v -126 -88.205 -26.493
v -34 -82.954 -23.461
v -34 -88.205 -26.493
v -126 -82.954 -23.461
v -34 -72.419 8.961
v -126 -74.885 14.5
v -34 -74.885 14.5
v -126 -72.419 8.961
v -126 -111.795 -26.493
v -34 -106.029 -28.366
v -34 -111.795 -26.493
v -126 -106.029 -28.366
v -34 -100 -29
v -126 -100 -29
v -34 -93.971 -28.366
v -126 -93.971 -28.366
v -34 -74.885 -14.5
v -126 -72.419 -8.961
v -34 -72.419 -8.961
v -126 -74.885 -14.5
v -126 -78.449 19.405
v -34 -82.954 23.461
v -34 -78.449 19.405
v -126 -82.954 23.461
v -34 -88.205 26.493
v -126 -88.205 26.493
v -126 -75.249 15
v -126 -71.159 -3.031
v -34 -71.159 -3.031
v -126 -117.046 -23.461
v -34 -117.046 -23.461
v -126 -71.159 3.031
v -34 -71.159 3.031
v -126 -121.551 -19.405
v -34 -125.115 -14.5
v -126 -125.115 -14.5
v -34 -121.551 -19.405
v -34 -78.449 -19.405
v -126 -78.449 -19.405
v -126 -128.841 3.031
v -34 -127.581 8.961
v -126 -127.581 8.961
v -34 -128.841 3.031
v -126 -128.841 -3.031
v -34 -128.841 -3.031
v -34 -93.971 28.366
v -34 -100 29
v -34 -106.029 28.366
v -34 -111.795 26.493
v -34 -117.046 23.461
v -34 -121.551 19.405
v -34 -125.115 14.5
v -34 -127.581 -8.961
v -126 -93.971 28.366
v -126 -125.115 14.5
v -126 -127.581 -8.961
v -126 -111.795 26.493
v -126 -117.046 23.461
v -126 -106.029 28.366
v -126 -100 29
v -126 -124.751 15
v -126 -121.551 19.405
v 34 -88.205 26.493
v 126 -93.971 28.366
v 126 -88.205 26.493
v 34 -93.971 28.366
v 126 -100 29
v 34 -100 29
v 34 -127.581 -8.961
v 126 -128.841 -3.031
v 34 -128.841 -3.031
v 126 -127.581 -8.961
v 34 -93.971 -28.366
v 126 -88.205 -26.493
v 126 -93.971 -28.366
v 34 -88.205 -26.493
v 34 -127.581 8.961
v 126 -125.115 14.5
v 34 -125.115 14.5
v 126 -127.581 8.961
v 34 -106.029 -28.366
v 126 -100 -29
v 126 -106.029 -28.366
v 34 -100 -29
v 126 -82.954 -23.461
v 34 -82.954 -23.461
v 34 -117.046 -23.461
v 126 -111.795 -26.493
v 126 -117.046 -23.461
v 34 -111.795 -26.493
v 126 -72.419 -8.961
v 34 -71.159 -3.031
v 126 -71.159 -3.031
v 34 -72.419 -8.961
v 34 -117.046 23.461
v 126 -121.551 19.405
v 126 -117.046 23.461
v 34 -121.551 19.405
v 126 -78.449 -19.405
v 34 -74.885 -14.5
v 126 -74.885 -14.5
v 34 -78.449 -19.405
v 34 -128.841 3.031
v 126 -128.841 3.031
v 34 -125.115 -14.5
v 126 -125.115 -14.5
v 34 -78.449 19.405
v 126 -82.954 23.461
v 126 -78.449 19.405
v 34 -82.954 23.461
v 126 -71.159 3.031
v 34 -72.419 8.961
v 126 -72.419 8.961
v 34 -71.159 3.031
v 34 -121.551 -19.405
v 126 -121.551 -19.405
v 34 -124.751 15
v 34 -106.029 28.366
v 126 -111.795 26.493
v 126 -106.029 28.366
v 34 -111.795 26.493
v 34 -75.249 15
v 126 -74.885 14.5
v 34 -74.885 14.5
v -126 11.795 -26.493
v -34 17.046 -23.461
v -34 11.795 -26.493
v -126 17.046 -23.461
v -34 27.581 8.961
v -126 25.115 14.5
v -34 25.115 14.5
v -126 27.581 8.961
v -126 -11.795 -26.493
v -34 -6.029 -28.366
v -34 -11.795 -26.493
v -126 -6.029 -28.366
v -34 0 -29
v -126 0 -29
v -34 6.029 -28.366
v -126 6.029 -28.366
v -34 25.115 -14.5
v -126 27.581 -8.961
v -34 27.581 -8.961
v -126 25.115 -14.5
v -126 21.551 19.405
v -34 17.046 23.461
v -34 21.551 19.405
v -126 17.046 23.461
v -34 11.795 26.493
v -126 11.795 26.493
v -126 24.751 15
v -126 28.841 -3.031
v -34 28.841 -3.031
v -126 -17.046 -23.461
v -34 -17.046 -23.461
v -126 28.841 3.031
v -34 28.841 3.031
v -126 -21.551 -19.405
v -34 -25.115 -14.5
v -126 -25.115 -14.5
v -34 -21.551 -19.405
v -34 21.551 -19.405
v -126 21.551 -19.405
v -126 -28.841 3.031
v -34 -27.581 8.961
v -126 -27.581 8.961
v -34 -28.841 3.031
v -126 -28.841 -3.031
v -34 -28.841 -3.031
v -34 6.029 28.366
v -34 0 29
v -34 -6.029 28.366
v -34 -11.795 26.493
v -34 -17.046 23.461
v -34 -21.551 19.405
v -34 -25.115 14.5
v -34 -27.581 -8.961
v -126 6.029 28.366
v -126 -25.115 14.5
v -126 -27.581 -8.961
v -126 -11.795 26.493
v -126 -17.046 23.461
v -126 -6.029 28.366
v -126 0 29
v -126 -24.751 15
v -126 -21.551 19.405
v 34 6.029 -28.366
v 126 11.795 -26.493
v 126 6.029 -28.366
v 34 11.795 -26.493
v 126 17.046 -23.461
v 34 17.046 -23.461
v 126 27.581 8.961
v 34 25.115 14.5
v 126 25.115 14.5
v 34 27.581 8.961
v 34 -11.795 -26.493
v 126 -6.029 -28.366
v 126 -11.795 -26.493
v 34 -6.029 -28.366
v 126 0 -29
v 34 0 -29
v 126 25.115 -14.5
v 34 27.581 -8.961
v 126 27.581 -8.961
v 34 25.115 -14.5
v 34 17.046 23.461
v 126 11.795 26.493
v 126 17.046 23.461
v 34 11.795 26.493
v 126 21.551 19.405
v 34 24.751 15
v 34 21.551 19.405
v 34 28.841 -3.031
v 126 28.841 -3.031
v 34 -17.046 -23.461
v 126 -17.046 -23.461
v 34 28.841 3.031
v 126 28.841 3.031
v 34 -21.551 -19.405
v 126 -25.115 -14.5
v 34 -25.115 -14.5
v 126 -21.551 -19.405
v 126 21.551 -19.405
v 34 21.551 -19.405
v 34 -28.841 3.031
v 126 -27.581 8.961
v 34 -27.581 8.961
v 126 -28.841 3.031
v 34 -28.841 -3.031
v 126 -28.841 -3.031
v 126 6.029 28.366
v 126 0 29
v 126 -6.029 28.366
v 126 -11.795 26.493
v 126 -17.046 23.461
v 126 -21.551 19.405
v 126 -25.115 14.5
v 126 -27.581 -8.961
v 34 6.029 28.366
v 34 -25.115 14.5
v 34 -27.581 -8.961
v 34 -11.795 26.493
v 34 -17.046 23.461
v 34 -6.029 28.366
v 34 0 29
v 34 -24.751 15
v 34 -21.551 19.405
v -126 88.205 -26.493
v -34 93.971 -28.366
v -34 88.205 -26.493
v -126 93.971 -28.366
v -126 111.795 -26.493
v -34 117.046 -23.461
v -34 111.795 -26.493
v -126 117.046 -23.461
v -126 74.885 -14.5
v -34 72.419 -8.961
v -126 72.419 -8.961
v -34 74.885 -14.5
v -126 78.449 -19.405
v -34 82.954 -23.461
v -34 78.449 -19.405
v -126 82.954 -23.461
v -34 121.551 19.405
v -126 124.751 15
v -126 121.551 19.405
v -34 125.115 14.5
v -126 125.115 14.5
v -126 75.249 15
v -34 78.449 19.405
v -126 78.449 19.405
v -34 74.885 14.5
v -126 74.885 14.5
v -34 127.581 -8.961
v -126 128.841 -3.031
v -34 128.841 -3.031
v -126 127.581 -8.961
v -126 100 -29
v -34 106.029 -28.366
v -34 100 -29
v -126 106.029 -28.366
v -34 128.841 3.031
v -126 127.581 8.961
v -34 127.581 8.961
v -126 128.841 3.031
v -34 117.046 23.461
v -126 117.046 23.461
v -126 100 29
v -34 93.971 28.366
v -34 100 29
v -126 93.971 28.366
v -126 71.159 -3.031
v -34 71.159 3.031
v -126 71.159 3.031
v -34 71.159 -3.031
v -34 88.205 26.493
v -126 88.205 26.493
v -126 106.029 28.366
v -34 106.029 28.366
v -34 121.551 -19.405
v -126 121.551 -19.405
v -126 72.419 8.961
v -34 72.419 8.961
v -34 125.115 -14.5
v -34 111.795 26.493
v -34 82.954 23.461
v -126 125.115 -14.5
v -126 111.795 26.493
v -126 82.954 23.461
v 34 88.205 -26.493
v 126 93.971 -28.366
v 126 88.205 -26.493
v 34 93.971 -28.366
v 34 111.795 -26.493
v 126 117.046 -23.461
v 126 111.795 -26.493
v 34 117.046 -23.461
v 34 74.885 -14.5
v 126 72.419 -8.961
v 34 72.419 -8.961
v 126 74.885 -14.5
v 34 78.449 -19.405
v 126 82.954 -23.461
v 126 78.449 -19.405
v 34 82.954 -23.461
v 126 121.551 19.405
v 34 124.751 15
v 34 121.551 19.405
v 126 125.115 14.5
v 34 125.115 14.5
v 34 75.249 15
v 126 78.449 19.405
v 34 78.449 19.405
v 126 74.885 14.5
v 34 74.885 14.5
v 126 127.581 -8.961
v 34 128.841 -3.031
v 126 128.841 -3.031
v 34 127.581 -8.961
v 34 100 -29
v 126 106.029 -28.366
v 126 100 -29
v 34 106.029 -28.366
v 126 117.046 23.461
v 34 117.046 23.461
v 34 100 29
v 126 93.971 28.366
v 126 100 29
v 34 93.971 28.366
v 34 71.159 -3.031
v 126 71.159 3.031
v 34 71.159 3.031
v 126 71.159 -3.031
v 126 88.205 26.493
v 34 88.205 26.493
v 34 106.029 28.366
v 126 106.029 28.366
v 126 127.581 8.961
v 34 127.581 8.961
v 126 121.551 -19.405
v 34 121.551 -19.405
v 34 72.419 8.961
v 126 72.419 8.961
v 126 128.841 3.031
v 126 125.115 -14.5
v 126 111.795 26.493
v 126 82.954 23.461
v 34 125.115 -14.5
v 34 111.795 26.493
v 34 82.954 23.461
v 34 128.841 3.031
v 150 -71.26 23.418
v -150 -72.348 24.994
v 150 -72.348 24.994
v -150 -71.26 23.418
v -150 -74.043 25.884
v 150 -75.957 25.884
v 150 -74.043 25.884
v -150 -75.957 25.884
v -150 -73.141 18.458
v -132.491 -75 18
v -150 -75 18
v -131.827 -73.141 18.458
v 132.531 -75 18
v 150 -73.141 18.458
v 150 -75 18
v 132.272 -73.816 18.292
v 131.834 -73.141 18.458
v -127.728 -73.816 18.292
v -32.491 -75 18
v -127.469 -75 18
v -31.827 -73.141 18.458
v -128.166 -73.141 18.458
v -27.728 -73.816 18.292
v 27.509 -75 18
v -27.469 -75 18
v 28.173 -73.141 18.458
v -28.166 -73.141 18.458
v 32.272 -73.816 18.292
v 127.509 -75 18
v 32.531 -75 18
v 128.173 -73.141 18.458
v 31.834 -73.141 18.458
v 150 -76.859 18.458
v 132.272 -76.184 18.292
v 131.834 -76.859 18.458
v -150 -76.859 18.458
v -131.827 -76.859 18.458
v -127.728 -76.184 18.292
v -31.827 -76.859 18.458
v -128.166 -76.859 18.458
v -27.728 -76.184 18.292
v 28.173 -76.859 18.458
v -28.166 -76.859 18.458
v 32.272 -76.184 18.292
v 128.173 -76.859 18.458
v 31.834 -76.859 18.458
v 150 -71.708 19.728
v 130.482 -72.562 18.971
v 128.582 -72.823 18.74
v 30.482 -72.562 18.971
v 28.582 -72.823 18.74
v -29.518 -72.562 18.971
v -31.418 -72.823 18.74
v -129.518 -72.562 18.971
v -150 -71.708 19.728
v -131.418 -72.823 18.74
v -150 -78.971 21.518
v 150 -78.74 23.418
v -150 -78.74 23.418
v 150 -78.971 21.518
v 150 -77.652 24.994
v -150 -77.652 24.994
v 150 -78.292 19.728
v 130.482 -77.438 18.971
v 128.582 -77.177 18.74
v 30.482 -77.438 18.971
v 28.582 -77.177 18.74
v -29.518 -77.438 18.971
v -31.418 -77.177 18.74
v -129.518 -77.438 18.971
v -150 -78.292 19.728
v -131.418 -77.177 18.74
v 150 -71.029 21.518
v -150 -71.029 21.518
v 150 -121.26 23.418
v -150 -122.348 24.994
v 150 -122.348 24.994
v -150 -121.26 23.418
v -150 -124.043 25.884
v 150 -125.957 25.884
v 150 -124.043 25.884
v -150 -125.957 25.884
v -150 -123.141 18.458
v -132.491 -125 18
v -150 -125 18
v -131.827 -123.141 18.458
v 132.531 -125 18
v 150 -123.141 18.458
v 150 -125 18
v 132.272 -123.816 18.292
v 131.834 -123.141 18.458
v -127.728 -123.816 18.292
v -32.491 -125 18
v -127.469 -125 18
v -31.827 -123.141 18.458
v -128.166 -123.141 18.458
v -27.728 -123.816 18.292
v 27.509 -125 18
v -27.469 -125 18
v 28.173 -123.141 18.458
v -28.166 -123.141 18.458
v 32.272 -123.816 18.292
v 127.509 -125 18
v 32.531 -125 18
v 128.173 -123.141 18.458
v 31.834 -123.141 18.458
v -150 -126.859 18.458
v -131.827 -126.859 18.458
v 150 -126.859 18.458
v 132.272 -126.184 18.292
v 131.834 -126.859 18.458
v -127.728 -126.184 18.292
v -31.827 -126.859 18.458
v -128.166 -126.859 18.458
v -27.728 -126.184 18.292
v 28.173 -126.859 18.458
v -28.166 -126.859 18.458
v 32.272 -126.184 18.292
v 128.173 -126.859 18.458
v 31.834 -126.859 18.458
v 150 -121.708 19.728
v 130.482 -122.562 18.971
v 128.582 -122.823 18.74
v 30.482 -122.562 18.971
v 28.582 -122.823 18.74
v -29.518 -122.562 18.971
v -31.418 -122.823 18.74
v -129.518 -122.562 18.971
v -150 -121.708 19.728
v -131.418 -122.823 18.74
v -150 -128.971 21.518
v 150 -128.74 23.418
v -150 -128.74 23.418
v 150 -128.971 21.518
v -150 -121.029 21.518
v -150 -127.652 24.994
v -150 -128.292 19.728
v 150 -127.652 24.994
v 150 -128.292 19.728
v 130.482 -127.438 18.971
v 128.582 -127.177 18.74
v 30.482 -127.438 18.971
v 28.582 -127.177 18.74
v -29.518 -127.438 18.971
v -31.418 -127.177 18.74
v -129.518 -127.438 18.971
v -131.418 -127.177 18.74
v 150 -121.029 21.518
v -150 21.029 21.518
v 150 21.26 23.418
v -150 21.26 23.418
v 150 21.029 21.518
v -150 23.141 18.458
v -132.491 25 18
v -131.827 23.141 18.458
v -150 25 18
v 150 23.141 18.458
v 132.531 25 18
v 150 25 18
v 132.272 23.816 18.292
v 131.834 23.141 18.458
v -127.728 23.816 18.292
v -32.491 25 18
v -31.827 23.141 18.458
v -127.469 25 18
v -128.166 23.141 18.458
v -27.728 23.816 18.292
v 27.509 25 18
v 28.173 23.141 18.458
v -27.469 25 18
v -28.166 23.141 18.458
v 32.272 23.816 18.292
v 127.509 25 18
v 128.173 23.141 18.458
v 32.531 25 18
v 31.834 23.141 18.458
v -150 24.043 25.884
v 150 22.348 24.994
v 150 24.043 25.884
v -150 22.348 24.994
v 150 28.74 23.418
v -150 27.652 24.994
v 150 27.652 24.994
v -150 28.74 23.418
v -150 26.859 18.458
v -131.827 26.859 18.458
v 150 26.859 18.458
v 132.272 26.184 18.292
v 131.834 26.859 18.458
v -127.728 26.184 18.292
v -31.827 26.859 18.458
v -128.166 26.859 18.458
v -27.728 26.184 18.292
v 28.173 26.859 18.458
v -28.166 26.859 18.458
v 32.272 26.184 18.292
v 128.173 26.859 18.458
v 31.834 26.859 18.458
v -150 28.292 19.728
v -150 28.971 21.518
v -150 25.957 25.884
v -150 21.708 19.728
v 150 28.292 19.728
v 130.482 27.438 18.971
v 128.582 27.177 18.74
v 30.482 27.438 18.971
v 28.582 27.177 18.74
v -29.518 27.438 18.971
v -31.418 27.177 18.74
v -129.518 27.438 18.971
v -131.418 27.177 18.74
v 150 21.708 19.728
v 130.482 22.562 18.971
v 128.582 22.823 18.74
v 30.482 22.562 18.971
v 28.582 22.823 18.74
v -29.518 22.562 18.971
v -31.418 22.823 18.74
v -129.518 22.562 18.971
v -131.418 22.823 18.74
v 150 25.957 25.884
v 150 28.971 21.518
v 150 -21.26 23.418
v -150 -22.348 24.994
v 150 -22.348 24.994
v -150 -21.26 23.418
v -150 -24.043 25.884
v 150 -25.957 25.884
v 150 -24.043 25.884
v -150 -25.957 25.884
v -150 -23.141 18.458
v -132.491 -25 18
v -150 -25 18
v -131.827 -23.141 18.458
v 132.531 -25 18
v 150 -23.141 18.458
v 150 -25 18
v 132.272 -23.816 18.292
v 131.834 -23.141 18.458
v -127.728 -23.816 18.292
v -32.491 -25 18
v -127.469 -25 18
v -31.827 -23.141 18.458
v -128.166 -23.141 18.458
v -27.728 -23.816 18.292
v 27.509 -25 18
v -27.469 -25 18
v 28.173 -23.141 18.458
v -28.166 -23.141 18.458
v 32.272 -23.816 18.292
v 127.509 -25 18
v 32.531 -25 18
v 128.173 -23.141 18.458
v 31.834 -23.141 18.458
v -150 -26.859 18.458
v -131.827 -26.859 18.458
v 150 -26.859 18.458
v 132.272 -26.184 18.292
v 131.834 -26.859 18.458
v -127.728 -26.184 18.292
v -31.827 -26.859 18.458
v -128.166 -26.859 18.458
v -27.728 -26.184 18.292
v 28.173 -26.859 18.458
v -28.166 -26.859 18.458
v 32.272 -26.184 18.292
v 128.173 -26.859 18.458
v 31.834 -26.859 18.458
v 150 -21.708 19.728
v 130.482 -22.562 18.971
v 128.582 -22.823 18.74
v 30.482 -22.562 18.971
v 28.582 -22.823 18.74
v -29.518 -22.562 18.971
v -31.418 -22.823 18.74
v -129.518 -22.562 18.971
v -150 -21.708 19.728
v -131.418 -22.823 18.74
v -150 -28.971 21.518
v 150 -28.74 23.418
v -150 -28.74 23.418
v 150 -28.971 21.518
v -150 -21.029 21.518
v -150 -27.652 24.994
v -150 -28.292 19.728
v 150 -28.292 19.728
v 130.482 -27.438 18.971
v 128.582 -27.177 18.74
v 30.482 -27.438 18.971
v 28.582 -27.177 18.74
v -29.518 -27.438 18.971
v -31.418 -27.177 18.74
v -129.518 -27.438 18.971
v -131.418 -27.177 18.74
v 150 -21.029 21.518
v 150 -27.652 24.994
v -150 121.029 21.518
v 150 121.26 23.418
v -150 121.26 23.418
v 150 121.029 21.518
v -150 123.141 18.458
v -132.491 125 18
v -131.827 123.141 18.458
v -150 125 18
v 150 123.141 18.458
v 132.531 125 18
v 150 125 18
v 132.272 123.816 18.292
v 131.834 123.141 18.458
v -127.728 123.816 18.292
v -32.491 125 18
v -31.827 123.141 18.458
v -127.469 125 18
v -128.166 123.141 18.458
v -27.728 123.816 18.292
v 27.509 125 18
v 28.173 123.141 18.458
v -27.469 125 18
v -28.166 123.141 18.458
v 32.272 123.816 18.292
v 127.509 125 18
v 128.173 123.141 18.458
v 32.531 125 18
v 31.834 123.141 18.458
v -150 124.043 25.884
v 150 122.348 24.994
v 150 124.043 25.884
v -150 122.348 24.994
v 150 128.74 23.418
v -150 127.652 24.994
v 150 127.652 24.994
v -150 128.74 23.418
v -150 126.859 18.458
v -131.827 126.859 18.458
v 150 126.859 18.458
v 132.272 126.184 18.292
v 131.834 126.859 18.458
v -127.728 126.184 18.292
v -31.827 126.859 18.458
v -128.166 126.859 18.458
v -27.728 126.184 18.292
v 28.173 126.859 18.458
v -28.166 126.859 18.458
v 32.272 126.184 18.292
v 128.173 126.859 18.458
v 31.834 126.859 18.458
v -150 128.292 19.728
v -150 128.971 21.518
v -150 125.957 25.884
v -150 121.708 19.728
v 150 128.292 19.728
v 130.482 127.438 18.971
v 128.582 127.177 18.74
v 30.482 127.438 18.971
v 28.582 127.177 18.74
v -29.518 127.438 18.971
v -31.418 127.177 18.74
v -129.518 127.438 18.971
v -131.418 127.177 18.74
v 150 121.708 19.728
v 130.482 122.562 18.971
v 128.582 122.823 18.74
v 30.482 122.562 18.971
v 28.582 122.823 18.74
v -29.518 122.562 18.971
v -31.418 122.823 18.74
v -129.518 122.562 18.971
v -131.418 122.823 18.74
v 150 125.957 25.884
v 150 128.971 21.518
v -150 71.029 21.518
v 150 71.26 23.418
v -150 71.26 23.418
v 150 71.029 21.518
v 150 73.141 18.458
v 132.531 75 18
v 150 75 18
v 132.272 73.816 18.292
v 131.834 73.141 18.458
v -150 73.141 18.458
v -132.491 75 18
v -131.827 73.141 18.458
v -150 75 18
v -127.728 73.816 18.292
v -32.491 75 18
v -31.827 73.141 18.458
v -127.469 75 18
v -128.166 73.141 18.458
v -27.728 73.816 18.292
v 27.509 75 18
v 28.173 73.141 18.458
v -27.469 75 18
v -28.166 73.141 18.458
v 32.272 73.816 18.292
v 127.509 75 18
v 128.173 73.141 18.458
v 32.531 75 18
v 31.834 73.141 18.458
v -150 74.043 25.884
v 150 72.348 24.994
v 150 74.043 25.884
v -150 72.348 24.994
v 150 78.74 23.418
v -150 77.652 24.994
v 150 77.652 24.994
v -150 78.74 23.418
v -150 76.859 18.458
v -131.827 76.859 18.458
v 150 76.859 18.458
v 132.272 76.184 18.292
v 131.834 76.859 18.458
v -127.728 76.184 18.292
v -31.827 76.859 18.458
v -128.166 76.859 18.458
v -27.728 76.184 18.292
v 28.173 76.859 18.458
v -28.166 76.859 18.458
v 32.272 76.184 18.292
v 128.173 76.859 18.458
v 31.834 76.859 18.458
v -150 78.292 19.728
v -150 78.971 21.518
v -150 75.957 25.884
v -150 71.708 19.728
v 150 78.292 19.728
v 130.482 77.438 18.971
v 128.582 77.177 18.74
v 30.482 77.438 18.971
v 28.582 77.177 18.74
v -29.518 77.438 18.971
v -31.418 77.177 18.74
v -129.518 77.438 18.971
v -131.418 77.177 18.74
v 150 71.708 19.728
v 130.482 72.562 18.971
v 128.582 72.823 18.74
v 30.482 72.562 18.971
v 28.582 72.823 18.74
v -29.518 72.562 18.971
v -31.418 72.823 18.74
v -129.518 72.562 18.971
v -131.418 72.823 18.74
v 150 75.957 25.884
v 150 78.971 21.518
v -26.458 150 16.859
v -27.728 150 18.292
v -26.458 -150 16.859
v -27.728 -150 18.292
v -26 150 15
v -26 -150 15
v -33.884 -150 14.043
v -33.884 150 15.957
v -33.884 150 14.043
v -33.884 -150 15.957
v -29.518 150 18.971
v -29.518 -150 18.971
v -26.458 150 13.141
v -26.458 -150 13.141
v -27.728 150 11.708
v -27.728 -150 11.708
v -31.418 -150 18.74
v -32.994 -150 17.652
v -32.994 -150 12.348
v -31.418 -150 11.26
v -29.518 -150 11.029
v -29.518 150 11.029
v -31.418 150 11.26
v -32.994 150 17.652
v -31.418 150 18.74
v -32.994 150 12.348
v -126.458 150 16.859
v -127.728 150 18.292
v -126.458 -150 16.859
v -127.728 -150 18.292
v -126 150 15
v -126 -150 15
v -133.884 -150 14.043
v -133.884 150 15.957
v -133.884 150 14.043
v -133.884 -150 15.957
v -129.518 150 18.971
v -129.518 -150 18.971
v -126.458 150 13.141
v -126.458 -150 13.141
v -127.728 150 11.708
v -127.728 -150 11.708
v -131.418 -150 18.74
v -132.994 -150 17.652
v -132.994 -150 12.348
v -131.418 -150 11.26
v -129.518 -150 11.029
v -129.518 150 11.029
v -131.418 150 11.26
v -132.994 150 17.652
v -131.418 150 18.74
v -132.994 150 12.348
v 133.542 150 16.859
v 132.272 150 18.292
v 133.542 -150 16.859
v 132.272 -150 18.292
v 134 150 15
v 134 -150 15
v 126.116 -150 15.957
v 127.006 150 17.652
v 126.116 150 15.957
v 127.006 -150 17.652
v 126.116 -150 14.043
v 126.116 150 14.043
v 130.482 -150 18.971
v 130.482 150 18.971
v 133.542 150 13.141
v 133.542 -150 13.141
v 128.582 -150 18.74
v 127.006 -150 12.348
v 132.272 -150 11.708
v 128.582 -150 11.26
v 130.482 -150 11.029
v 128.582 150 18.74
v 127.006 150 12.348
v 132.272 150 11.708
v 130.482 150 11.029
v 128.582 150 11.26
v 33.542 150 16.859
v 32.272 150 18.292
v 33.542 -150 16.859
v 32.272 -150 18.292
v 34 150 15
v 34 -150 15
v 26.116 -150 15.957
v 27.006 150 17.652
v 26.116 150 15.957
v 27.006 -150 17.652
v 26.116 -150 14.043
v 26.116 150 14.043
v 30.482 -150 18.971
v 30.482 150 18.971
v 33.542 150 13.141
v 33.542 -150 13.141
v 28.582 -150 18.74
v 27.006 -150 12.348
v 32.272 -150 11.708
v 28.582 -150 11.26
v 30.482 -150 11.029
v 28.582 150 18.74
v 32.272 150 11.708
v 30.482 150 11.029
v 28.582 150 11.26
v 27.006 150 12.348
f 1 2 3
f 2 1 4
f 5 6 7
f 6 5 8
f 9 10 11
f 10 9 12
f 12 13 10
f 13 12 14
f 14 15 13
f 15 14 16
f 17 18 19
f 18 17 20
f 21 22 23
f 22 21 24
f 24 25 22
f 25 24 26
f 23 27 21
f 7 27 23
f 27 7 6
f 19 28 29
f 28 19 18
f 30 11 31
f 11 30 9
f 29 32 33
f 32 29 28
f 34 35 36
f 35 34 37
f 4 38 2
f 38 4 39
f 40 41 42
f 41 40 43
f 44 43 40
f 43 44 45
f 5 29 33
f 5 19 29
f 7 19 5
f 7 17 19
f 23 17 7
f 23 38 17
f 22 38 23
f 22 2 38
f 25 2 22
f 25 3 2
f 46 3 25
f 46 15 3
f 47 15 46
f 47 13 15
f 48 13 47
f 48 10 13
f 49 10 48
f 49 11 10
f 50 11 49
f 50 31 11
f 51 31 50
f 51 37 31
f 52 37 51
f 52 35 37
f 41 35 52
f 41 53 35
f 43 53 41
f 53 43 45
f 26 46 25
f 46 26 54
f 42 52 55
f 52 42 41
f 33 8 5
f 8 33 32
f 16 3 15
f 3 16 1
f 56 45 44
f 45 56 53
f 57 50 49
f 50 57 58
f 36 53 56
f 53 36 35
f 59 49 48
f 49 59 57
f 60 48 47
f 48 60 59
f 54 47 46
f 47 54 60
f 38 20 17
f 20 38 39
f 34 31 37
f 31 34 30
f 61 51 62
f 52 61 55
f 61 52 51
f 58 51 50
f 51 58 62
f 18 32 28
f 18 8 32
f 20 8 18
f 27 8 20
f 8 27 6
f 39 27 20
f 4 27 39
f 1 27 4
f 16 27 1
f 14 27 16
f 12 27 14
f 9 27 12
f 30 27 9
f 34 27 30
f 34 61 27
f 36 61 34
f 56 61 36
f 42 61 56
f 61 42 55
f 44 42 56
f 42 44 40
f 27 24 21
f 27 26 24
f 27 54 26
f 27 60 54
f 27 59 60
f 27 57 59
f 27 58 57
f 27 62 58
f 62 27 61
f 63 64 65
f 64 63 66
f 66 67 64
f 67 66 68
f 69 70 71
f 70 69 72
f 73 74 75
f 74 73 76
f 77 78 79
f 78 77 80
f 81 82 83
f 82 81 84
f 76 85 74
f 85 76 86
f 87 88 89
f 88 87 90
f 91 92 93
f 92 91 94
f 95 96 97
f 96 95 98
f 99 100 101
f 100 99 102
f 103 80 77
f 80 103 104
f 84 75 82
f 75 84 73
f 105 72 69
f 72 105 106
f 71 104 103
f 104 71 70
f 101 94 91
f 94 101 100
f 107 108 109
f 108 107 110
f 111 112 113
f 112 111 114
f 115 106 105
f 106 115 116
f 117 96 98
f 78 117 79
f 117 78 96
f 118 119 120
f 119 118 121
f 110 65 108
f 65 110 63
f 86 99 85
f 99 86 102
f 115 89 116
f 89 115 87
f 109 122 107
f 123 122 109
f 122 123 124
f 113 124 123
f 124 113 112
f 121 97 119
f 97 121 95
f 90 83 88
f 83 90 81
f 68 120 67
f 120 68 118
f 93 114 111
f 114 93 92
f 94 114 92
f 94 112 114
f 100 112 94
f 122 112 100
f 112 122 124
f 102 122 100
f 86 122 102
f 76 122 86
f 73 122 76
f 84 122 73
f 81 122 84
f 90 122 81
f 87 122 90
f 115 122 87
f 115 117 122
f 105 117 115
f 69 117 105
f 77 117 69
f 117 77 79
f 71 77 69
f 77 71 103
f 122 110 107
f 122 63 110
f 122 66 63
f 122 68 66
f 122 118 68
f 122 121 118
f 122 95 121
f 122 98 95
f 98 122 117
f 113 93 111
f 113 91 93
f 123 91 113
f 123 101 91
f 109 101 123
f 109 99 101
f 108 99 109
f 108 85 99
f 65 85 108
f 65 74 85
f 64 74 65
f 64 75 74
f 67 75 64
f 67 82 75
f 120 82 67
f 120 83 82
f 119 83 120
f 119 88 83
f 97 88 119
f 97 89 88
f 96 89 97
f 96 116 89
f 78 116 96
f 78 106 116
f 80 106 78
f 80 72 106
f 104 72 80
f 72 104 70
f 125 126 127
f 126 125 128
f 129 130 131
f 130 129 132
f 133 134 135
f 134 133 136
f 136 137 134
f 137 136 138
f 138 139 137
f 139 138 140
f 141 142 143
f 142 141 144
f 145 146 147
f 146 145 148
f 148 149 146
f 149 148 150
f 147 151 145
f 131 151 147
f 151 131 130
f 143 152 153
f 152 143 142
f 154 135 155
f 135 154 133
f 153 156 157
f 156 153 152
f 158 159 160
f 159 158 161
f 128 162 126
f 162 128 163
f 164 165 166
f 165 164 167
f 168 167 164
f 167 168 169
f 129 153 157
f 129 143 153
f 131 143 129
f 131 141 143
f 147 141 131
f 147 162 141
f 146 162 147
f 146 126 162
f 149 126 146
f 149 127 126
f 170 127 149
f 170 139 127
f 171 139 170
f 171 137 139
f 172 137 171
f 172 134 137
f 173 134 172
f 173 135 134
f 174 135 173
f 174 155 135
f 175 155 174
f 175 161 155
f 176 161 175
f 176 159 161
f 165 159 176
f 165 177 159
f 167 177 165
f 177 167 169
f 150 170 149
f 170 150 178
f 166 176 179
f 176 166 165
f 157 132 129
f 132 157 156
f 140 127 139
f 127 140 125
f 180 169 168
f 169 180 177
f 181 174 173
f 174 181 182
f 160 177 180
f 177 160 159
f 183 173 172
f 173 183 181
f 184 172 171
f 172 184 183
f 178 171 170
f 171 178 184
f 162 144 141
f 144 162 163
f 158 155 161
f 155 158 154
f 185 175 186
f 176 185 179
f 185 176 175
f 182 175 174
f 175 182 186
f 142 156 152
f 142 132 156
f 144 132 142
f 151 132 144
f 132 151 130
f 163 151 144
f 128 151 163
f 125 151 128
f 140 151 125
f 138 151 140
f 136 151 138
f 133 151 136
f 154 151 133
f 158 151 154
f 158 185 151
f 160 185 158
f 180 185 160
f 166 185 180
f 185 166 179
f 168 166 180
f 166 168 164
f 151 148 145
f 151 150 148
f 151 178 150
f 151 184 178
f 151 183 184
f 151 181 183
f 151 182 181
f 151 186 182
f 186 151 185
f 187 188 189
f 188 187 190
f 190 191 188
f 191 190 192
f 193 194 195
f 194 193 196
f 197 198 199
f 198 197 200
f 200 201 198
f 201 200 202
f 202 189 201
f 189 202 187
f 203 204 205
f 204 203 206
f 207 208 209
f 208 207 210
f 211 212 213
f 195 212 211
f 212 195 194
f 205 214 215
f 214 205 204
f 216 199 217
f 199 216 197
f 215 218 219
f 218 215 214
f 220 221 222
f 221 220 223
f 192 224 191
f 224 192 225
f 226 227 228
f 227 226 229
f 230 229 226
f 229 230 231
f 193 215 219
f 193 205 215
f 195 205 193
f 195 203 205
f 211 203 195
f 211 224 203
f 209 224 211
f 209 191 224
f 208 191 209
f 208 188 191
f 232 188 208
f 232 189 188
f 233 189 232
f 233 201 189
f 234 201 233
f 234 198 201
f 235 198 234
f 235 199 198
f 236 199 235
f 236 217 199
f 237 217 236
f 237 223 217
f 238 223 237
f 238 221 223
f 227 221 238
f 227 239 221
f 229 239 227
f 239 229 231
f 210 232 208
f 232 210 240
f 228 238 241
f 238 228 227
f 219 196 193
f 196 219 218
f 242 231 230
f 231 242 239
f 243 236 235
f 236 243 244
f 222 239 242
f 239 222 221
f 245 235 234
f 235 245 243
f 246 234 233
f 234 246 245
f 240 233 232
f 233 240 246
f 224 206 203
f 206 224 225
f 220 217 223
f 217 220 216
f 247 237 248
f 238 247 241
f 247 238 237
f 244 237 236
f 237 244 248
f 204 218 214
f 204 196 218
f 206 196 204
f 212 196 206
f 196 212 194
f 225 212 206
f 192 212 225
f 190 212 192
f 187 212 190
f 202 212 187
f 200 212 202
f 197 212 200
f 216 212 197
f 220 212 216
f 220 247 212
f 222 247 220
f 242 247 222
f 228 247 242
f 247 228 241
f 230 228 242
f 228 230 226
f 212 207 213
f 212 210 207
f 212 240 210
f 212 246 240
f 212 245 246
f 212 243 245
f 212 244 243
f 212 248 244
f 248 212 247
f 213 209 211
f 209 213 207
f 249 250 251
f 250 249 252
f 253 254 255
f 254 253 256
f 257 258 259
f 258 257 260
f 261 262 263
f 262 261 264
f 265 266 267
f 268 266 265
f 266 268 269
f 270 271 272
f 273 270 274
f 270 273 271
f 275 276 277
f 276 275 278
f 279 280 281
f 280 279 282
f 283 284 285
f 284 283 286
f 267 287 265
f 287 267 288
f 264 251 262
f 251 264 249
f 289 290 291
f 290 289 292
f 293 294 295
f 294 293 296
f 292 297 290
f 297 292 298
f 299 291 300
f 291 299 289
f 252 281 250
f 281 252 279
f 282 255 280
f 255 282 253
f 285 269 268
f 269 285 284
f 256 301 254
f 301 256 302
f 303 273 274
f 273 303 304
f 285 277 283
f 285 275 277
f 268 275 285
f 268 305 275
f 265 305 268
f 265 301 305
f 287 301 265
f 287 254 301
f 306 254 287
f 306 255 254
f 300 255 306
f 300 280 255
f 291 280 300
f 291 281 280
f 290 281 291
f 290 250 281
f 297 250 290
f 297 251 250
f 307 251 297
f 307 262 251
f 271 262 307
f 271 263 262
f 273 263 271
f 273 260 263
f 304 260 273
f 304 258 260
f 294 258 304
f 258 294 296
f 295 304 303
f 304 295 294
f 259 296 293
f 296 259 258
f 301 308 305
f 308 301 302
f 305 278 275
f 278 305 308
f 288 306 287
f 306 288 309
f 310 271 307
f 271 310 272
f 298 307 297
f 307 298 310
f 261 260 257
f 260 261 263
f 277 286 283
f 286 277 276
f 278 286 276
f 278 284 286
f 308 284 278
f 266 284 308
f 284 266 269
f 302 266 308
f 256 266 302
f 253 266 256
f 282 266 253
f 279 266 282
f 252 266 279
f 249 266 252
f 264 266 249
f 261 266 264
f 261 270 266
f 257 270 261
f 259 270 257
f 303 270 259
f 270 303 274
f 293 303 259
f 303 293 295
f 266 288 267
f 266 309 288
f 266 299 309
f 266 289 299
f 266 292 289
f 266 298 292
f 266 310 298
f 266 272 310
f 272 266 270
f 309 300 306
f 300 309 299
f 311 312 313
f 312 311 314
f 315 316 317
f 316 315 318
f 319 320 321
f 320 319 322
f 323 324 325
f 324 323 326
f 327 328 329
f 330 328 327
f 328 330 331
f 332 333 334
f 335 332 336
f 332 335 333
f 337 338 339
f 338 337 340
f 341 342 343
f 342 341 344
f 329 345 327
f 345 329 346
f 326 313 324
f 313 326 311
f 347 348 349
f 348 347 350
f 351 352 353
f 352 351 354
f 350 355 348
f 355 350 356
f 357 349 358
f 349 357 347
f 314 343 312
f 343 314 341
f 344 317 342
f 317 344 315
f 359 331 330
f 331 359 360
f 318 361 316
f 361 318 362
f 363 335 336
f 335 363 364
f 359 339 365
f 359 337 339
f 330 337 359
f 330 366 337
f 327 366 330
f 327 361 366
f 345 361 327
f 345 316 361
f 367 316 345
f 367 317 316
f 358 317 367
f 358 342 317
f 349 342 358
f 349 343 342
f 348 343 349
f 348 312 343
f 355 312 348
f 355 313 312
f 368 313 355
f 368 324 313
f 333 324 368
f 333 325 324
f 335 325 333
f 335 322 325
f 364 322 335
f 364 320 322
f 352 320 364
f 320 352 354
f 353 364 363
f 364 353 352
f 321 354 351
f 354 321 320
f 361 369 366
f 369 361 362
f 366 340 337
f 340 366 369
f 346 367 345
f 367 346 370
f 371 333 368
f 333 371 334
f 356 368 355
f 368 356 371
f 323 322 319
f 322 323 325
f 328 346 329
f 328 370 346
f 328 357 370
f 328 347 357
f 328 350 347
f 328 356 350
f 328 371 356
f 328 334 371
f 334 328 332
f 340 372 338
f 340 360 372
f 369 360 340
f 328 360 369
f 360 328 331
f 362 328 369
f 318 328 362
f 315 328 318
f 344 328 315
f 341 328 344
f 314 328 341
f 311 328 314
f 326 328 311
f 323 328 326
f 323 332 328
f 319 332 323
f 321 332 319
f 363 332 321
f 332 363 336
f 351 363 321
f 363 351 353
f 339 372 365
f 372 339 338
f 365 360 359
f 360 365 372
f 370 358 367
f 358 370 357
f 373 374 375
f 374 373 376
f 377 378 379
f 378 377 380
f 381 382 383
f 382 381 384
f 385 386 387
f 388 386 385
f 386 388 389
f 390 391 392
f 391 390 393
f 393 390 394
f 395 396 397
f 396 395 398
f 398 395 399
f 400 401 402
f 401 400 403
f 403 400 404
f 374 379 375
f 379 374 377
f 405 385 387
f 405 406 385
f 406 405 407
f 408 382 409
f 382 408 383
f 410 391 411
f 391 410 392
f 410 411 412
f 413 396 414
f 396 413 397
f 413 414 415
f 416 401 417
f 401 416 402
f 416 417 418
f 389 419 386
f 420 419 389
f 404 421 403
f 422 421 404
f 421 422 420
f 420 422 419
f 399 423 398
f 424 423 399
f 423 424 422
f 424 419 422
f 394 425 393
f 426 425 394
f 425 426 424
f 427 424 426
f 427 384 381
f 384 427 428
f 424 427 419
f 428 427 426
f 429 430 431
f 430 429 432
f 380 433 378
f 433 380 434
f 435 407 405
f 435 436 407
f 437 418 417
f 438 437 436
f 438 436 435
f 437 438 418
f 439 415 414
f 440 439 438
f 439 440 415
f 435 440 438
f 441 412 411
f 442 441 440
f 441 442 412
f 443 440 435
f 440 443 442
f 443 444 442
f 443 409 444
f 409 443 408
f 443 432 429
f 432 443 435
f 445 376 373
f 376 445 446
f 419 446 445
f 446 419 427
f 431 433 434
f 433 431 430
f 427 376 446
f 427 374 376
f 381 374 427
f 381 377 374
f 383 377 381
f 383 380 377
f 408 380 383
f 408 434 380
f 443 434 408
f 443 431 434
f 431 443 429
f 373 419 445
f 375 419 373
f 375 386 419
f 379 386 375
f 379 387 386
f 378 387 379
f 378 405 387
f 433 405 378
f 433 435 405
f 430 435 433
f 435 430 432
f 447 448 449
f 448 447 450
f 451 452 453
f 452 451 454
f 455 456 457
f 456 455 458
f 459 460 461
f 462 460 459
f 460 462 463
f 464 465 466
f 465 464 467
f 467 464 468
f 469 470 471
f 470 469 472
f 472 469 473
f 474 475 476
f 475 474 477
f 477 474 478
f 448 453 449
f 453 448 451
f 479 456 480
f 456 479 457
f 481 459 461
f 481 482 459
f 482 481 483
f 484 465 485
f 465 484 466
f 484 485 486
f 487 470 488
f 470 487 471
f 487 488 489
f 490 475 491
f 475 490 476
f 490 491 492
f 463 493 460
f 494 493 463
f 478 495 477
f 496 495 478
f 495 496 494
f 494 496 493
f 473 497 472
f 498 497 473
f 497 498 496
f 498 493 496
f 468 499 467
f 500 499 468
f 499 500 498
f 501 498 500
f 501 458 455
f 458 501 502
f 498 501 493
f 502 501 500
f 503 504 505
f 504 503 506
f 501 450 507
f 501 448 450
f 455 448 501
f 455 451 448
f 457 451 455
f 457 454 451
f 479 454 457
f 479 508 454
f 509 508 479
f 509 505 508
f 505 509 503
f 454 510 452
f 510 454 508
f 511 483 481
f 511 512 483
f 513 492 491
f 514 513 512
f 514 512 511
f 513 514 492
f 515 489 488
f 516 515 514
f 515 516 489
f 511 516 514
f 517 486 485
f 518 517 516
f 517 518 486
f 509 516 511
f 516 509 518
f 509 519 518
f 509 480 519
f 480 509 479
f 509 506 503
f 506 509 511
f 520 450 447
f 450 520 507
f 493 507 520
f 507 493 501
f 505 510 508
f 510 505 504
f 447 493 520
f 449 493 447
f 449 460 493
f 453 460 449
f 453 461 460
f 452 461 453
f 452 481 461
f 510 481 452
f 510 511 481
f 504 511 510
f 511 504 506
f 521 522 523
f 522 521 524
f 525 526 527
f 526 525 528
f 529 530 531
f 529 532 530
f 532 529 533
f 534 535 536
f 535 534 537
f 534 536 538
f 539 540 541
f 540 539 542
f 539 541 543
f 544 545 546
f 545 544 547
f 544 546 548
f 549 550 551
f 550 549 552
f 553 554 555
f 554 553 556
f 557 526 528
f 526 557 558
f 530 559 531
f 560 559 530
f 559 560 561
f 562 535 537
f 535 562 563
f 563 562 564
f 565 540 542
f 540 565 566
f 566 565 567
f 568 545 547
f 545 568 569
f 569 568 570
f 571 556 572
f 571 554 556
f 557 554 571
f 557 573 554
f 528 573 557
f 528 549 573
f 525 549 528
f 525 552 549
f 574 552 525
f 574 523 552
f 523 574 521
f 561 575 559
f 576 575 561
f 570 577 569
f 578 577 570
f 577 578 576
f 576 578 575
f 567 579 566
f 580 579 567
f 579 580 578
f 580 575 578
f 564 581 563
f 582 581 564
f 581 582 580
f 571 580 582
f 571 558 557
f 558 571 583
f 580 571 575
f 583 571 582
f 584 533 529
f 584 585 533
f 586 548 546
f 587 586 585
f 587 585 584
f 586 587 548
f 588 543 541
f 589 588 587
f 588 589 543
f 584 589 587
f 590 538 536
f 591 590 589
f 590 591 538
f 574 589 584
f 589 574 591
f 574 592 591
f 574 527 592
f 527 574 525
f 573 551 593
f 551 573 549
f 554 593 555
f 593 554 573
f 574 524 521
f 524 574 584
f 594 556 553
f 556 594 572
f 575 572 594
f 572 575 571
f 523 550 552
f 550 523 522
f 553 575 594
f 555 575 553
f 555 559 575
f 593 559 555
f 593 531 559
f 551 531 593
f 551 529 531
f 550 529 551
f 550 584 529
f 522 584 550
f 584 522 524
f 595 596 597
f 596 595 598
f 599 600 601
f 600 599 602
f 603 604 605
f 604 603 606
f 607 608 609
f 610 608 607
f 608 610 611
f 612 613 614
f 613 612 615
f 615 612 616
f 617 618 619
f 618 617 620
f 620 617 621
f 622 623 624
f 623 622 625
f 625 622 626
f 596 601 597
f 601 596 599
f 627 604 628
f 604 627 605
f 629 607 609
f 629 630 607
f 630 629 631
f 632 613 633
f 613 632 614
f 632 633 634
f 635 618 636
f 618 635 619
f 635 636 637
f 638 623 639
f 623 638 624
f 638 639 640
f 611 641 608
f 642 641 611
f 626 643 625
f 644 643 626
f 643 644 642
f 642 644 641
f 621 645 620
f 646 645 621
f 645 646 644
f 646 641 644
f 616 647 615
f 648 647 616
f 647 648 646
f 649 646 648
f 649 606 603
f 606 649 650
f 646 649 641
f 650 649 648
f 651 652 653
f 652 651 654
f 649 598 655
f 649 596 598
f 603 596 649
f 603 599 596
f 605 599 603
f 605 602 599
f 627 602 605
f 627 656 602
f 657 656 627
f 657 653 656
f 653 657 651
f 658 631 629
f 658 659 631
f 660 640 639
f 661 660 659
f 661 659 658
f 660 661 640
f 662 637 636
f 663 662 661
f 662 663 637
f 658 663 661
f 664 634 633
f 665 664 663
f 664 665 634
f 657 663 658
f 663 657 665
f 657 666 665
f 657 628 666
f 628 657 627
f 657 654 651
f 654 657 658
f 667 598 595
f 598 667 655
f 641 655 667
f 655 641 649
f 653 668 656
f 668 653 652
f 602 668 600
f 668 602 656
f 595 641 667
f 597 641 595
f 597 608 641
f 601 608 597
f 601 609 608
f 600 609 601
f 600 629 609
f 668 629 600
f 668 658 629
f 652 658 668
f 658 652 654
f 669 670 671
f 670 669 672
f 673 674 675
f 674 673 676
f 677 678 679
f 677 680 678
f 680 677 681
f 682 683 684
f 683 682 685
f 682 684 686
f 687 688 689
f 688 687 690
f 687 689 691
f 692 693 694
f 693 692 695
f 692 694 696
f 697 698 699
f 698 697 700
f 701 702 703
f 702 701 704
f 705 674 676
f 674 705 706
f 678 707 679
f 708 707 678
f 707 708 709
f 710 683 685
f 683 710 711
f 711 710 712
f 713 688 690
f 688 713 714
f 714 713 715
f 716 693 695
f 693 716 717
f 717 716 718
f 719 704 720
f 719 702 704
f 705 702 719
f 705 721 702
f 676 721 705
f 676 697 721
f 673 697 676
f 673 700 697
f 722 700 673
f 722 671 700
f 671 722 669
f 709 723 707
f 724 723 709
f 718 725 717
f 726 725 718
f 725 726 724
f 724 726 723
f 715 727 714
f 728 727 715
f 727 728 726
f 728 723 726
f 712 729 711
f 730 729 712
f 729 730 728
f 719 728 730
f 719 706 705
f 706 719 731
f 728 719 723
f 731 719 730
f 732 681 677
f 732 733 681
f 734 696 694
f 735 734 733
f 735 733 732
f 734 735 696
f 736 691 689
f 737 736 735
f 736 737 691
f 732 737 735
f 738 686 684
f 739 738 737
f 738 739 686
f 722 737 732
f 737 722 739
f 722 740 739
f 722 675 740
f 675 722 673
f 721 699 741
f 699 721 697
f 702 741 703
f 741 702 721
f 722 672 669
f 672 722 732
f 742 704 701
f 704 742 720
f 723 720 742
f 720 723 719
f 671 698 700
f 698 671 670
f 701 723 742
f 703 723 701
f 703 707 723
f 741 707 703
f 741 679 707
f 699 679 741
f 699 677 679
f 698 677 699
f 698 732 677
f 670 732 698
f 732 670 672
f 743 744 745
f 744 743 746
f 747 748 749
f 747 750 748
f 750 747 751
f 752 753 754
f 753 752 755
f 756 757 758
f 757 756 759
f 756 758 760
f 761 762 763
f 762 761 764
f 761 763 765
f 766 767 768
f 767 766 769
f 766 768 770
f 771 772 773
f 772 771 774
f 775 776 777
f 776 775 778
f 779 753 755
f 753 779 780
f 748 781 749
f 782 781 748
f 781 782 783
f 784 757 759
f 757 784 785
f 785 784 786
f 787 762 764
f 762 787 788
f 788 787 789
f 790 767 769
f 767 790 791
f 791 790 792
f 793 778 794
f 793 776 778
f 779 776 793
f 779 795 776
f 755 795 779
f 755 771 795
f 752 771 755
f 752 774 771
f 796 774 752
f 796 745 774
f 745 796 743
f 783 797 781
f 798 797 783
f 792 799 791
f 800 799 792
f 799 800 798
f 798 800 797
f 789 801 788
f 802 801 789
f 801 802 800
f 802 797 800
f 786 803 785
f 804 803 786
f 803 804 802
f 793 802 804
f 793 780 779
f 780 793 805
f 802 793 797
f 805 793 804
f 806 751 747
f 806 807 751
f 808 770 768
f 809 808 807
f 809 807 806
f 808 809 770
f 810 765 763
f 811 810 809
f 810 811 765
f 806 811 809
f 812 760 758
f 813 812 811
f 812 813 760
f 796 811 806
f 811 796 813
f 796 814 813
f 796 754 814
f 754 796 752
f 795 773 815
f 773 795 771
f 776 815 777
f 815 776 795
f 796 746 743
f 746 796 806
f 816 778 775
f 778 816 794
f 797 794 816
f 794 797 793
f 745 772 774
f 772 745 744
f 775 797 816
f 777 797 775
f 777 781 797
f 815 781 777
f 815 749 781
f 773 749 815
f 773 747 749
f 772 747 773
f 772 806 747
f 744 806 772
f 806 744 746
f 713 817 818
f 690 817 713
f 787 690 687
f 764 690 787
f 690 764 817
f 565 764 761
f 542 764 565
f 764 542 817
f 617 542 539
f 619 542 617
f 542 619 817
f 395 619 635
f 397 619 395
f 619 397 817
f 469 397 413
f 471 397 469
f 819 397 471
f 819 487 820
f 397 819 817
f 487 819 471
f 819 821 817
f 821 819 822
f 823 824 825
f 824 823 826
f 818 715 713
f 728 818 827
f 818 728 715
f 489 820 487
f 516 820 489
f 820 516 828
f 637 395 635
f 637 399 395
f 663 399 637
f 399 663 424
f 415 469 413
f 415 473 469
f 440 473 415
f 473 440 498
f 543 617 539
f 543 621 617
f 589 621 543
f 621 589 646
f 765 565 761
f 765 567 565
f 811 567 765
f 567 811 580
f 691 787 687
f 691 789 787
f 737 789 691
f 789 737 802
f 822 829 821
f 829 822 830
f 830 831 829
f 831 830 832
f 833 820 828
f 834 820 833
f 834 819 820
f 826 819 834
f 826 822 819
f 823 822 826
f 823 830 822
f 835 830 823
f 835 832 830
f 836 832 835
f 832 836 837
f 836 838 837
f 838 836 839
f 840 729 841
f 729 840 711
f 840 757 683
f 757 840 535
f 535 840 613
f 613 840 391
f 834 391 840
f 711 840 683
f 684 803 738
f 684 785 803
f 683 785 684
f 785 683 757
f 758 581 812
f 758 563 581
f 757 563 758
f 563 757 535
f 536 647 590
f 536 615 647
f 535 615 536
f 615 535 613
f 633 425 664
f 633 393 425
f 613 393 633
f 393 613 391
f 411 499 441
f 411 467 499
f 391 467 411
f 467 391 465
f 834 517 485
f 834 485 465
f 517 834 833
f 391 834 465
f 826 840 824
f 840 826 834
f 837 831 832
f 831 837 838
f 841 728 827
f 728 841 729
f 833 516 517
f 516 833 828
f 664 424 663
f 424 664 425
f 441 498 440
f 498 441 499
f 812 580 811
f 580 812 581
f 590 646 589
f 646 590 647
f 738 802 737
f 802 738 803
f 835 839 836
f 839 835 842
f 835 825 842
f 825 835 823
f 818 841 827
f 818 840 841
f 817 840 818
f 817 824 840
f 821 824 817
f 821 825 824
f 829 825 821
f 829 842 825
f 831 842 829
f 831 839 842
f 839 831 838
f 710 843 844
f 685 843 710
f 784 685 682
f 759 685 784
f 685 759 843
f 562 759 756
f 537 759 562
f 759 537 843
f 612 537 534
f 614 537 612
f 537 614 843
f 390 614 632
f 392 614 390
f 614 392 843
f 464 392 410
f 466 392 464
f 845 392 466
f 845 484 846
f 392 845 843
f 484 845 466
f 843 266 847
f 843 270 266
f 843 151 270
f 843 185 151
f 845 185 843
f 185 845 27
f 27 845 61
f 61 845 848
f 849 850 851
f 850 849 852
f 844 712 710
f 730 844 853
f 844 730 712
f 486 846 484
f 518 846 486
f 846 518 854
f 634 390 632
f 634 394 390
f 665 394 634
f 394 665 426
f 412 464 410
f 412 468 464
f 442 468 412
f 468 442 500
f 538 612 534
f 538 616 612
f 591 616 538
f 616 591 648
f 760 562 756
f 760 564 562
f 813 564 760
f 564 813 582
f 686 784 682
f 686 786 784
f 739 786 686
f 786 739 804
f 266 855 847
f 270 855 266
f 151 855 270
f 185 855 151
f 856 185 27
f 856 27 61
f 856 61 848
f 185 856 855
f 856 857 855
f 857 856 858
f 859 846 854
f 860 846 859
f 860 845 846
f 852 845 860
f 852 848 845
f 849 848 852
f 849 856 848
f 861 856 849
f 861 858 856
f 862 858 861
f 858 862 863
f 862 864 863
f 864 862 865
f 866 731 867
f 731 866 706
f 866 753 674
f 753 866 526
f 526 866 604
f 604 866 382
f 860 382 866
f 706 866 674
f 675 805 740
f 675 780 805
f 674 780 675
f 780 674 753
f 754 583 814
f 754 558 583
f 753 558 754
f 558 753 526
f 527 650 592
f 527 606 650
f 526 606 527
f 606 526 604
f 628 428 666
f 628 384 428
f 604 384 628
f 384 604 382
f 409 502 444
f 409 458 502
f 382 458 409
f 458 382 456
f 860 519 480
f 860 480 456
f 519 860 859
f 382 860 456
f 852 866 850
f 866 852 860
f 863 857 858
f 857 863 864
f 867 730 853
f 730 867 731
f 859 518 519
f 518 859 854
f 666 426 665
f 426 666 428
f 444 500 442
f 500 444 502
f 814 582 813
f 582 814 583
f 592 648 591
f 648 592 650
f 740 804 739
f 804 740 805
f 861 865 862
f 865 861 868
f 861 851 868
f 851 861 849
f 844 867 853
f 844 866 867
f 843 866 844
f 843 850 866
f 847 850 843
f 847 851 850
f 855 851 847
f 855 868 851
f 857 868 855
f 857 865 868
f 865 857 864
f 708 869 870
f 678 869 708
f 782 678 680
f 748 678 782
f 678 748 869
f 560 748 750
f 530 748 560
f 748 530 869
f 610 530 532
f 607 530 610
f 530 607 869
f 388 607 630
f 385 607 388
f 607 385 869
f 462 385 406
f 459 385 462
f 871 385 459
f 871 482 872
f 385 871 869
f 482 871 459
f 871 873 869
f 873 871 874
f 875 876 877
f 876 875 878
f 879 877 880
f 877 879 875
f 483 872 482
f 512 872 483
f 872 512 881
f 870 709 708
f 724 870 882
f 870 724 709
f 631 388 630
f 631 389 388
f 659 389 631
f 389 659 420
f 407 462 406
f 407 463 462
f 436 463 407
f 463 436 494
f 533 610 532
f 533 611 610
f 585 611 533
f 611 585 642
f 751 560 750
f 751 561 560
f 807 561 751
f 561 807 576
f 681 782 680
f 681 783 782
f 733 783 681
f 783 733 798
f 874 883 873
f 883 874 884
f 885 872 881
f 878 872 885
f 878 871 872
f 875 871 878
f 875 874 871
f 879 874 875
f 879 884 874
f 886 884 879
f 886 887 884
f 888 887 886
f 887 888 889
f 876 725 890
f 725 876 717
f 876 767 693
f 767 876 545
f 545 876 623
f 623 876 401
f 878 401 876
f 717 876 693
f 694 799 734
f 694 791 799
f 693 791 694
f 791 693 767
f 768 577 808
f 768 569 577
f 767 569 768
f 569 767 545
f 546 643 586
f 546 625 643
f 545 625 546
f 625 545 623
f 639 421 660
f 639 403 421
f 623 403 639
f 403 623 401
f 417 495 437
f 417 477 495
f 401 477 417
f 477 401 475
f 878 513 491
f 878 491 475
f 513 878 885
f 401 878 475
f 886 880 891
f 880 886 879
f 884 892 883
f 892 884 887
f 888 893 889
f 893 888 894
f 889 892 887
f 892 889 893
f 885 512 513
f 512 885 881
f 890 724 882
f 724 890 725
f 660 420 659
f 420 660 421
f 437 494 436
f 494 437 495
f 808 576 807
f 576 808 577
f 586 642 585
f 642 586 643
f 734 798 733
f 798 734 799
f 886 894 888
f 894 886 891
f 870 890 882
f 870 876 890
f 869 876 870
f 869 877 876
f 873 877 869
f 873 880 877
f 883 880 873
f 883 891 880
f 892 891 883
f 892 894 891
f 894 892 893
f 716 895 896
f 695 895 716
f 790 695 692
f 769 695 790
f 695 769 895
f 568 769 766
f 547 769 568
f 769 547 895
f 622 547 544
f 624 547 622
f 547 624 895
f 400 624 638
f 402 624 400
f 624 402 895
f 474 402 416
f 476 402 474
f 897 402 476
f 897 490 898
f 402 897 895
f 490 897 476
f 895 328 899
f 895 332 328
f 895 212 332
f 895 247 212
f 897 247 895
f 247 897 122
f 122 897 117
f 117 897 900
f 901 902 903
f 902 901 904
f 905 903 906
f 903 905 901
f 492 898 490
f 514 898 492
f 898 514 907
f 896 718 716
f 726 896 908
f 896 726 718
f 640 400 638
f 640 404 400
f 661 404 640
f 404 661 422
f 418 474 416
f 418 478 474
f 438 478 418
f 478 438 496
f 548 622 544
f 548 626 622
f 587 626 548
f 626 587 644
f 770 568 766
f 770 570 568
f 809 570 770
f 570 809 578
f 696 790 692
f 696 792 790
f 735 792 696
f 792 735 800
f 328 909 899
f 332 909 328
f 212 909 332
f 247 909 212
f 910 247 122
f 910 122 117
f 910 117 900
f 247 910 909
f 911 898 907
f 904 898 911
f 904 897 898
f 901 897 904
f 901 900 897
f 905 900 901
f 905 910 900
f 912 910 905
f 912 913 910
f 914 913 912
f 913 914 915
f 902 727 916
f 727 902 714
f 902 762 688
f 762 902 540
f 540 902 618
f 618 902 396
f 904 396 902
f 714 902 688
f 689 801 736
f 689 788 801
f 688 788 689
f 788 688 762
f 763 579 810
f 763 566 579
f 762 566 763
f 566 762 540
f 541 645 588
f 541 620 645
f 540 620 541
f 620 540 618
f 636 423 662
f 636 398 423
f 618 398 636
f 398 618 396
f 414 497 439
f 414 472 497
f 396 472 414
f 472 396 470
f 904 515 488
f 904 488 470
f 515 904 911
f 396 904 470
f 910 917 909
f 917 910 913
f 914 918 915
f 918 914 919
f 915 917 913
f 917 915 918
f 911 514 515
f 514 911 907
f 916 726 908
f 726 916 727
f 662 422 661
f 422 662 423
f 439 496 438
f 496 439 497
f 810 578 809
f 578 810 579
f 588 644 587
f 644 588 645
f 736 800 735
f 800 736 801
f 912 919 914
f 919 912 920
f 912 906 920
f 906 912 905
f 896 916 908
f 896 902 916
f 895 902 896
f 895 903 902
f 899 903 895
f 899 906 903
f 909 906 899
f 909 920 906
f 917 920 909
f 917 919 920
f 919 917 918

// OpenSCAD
module paal_blauw_y() {
  rotate([0,90,00])
    color("Blue") 
      cylinder(h=300, d=8, center=true);

}


module paal_blauw_x() {
  rotate([90,0,00])
    color("Blue") 
      cylinder(h=300, d=8, center=true);
}


module vat_200l()  {
   rotate([0,90,00])
   color("DeepSkyBlue") {
       cylinder(h=92, d=58, center=true);
   }
}

for (y = [-100, 0, 100]) {
    for (x = [-80, 80]) translate([x,y,0]) vat_200l();
}

for (y = [-100, 0, 100]) {
    translate([0,y + 25,22]) paal_blauw_y();
    translate([0,y - 25,22]) paal_blauw_y();
}

for (x = [-80, 80]) {
    translate([x+50,0,15]) paal_blauw_x();
    translate([x-50,0,15]) paal_blauw_x();
}
